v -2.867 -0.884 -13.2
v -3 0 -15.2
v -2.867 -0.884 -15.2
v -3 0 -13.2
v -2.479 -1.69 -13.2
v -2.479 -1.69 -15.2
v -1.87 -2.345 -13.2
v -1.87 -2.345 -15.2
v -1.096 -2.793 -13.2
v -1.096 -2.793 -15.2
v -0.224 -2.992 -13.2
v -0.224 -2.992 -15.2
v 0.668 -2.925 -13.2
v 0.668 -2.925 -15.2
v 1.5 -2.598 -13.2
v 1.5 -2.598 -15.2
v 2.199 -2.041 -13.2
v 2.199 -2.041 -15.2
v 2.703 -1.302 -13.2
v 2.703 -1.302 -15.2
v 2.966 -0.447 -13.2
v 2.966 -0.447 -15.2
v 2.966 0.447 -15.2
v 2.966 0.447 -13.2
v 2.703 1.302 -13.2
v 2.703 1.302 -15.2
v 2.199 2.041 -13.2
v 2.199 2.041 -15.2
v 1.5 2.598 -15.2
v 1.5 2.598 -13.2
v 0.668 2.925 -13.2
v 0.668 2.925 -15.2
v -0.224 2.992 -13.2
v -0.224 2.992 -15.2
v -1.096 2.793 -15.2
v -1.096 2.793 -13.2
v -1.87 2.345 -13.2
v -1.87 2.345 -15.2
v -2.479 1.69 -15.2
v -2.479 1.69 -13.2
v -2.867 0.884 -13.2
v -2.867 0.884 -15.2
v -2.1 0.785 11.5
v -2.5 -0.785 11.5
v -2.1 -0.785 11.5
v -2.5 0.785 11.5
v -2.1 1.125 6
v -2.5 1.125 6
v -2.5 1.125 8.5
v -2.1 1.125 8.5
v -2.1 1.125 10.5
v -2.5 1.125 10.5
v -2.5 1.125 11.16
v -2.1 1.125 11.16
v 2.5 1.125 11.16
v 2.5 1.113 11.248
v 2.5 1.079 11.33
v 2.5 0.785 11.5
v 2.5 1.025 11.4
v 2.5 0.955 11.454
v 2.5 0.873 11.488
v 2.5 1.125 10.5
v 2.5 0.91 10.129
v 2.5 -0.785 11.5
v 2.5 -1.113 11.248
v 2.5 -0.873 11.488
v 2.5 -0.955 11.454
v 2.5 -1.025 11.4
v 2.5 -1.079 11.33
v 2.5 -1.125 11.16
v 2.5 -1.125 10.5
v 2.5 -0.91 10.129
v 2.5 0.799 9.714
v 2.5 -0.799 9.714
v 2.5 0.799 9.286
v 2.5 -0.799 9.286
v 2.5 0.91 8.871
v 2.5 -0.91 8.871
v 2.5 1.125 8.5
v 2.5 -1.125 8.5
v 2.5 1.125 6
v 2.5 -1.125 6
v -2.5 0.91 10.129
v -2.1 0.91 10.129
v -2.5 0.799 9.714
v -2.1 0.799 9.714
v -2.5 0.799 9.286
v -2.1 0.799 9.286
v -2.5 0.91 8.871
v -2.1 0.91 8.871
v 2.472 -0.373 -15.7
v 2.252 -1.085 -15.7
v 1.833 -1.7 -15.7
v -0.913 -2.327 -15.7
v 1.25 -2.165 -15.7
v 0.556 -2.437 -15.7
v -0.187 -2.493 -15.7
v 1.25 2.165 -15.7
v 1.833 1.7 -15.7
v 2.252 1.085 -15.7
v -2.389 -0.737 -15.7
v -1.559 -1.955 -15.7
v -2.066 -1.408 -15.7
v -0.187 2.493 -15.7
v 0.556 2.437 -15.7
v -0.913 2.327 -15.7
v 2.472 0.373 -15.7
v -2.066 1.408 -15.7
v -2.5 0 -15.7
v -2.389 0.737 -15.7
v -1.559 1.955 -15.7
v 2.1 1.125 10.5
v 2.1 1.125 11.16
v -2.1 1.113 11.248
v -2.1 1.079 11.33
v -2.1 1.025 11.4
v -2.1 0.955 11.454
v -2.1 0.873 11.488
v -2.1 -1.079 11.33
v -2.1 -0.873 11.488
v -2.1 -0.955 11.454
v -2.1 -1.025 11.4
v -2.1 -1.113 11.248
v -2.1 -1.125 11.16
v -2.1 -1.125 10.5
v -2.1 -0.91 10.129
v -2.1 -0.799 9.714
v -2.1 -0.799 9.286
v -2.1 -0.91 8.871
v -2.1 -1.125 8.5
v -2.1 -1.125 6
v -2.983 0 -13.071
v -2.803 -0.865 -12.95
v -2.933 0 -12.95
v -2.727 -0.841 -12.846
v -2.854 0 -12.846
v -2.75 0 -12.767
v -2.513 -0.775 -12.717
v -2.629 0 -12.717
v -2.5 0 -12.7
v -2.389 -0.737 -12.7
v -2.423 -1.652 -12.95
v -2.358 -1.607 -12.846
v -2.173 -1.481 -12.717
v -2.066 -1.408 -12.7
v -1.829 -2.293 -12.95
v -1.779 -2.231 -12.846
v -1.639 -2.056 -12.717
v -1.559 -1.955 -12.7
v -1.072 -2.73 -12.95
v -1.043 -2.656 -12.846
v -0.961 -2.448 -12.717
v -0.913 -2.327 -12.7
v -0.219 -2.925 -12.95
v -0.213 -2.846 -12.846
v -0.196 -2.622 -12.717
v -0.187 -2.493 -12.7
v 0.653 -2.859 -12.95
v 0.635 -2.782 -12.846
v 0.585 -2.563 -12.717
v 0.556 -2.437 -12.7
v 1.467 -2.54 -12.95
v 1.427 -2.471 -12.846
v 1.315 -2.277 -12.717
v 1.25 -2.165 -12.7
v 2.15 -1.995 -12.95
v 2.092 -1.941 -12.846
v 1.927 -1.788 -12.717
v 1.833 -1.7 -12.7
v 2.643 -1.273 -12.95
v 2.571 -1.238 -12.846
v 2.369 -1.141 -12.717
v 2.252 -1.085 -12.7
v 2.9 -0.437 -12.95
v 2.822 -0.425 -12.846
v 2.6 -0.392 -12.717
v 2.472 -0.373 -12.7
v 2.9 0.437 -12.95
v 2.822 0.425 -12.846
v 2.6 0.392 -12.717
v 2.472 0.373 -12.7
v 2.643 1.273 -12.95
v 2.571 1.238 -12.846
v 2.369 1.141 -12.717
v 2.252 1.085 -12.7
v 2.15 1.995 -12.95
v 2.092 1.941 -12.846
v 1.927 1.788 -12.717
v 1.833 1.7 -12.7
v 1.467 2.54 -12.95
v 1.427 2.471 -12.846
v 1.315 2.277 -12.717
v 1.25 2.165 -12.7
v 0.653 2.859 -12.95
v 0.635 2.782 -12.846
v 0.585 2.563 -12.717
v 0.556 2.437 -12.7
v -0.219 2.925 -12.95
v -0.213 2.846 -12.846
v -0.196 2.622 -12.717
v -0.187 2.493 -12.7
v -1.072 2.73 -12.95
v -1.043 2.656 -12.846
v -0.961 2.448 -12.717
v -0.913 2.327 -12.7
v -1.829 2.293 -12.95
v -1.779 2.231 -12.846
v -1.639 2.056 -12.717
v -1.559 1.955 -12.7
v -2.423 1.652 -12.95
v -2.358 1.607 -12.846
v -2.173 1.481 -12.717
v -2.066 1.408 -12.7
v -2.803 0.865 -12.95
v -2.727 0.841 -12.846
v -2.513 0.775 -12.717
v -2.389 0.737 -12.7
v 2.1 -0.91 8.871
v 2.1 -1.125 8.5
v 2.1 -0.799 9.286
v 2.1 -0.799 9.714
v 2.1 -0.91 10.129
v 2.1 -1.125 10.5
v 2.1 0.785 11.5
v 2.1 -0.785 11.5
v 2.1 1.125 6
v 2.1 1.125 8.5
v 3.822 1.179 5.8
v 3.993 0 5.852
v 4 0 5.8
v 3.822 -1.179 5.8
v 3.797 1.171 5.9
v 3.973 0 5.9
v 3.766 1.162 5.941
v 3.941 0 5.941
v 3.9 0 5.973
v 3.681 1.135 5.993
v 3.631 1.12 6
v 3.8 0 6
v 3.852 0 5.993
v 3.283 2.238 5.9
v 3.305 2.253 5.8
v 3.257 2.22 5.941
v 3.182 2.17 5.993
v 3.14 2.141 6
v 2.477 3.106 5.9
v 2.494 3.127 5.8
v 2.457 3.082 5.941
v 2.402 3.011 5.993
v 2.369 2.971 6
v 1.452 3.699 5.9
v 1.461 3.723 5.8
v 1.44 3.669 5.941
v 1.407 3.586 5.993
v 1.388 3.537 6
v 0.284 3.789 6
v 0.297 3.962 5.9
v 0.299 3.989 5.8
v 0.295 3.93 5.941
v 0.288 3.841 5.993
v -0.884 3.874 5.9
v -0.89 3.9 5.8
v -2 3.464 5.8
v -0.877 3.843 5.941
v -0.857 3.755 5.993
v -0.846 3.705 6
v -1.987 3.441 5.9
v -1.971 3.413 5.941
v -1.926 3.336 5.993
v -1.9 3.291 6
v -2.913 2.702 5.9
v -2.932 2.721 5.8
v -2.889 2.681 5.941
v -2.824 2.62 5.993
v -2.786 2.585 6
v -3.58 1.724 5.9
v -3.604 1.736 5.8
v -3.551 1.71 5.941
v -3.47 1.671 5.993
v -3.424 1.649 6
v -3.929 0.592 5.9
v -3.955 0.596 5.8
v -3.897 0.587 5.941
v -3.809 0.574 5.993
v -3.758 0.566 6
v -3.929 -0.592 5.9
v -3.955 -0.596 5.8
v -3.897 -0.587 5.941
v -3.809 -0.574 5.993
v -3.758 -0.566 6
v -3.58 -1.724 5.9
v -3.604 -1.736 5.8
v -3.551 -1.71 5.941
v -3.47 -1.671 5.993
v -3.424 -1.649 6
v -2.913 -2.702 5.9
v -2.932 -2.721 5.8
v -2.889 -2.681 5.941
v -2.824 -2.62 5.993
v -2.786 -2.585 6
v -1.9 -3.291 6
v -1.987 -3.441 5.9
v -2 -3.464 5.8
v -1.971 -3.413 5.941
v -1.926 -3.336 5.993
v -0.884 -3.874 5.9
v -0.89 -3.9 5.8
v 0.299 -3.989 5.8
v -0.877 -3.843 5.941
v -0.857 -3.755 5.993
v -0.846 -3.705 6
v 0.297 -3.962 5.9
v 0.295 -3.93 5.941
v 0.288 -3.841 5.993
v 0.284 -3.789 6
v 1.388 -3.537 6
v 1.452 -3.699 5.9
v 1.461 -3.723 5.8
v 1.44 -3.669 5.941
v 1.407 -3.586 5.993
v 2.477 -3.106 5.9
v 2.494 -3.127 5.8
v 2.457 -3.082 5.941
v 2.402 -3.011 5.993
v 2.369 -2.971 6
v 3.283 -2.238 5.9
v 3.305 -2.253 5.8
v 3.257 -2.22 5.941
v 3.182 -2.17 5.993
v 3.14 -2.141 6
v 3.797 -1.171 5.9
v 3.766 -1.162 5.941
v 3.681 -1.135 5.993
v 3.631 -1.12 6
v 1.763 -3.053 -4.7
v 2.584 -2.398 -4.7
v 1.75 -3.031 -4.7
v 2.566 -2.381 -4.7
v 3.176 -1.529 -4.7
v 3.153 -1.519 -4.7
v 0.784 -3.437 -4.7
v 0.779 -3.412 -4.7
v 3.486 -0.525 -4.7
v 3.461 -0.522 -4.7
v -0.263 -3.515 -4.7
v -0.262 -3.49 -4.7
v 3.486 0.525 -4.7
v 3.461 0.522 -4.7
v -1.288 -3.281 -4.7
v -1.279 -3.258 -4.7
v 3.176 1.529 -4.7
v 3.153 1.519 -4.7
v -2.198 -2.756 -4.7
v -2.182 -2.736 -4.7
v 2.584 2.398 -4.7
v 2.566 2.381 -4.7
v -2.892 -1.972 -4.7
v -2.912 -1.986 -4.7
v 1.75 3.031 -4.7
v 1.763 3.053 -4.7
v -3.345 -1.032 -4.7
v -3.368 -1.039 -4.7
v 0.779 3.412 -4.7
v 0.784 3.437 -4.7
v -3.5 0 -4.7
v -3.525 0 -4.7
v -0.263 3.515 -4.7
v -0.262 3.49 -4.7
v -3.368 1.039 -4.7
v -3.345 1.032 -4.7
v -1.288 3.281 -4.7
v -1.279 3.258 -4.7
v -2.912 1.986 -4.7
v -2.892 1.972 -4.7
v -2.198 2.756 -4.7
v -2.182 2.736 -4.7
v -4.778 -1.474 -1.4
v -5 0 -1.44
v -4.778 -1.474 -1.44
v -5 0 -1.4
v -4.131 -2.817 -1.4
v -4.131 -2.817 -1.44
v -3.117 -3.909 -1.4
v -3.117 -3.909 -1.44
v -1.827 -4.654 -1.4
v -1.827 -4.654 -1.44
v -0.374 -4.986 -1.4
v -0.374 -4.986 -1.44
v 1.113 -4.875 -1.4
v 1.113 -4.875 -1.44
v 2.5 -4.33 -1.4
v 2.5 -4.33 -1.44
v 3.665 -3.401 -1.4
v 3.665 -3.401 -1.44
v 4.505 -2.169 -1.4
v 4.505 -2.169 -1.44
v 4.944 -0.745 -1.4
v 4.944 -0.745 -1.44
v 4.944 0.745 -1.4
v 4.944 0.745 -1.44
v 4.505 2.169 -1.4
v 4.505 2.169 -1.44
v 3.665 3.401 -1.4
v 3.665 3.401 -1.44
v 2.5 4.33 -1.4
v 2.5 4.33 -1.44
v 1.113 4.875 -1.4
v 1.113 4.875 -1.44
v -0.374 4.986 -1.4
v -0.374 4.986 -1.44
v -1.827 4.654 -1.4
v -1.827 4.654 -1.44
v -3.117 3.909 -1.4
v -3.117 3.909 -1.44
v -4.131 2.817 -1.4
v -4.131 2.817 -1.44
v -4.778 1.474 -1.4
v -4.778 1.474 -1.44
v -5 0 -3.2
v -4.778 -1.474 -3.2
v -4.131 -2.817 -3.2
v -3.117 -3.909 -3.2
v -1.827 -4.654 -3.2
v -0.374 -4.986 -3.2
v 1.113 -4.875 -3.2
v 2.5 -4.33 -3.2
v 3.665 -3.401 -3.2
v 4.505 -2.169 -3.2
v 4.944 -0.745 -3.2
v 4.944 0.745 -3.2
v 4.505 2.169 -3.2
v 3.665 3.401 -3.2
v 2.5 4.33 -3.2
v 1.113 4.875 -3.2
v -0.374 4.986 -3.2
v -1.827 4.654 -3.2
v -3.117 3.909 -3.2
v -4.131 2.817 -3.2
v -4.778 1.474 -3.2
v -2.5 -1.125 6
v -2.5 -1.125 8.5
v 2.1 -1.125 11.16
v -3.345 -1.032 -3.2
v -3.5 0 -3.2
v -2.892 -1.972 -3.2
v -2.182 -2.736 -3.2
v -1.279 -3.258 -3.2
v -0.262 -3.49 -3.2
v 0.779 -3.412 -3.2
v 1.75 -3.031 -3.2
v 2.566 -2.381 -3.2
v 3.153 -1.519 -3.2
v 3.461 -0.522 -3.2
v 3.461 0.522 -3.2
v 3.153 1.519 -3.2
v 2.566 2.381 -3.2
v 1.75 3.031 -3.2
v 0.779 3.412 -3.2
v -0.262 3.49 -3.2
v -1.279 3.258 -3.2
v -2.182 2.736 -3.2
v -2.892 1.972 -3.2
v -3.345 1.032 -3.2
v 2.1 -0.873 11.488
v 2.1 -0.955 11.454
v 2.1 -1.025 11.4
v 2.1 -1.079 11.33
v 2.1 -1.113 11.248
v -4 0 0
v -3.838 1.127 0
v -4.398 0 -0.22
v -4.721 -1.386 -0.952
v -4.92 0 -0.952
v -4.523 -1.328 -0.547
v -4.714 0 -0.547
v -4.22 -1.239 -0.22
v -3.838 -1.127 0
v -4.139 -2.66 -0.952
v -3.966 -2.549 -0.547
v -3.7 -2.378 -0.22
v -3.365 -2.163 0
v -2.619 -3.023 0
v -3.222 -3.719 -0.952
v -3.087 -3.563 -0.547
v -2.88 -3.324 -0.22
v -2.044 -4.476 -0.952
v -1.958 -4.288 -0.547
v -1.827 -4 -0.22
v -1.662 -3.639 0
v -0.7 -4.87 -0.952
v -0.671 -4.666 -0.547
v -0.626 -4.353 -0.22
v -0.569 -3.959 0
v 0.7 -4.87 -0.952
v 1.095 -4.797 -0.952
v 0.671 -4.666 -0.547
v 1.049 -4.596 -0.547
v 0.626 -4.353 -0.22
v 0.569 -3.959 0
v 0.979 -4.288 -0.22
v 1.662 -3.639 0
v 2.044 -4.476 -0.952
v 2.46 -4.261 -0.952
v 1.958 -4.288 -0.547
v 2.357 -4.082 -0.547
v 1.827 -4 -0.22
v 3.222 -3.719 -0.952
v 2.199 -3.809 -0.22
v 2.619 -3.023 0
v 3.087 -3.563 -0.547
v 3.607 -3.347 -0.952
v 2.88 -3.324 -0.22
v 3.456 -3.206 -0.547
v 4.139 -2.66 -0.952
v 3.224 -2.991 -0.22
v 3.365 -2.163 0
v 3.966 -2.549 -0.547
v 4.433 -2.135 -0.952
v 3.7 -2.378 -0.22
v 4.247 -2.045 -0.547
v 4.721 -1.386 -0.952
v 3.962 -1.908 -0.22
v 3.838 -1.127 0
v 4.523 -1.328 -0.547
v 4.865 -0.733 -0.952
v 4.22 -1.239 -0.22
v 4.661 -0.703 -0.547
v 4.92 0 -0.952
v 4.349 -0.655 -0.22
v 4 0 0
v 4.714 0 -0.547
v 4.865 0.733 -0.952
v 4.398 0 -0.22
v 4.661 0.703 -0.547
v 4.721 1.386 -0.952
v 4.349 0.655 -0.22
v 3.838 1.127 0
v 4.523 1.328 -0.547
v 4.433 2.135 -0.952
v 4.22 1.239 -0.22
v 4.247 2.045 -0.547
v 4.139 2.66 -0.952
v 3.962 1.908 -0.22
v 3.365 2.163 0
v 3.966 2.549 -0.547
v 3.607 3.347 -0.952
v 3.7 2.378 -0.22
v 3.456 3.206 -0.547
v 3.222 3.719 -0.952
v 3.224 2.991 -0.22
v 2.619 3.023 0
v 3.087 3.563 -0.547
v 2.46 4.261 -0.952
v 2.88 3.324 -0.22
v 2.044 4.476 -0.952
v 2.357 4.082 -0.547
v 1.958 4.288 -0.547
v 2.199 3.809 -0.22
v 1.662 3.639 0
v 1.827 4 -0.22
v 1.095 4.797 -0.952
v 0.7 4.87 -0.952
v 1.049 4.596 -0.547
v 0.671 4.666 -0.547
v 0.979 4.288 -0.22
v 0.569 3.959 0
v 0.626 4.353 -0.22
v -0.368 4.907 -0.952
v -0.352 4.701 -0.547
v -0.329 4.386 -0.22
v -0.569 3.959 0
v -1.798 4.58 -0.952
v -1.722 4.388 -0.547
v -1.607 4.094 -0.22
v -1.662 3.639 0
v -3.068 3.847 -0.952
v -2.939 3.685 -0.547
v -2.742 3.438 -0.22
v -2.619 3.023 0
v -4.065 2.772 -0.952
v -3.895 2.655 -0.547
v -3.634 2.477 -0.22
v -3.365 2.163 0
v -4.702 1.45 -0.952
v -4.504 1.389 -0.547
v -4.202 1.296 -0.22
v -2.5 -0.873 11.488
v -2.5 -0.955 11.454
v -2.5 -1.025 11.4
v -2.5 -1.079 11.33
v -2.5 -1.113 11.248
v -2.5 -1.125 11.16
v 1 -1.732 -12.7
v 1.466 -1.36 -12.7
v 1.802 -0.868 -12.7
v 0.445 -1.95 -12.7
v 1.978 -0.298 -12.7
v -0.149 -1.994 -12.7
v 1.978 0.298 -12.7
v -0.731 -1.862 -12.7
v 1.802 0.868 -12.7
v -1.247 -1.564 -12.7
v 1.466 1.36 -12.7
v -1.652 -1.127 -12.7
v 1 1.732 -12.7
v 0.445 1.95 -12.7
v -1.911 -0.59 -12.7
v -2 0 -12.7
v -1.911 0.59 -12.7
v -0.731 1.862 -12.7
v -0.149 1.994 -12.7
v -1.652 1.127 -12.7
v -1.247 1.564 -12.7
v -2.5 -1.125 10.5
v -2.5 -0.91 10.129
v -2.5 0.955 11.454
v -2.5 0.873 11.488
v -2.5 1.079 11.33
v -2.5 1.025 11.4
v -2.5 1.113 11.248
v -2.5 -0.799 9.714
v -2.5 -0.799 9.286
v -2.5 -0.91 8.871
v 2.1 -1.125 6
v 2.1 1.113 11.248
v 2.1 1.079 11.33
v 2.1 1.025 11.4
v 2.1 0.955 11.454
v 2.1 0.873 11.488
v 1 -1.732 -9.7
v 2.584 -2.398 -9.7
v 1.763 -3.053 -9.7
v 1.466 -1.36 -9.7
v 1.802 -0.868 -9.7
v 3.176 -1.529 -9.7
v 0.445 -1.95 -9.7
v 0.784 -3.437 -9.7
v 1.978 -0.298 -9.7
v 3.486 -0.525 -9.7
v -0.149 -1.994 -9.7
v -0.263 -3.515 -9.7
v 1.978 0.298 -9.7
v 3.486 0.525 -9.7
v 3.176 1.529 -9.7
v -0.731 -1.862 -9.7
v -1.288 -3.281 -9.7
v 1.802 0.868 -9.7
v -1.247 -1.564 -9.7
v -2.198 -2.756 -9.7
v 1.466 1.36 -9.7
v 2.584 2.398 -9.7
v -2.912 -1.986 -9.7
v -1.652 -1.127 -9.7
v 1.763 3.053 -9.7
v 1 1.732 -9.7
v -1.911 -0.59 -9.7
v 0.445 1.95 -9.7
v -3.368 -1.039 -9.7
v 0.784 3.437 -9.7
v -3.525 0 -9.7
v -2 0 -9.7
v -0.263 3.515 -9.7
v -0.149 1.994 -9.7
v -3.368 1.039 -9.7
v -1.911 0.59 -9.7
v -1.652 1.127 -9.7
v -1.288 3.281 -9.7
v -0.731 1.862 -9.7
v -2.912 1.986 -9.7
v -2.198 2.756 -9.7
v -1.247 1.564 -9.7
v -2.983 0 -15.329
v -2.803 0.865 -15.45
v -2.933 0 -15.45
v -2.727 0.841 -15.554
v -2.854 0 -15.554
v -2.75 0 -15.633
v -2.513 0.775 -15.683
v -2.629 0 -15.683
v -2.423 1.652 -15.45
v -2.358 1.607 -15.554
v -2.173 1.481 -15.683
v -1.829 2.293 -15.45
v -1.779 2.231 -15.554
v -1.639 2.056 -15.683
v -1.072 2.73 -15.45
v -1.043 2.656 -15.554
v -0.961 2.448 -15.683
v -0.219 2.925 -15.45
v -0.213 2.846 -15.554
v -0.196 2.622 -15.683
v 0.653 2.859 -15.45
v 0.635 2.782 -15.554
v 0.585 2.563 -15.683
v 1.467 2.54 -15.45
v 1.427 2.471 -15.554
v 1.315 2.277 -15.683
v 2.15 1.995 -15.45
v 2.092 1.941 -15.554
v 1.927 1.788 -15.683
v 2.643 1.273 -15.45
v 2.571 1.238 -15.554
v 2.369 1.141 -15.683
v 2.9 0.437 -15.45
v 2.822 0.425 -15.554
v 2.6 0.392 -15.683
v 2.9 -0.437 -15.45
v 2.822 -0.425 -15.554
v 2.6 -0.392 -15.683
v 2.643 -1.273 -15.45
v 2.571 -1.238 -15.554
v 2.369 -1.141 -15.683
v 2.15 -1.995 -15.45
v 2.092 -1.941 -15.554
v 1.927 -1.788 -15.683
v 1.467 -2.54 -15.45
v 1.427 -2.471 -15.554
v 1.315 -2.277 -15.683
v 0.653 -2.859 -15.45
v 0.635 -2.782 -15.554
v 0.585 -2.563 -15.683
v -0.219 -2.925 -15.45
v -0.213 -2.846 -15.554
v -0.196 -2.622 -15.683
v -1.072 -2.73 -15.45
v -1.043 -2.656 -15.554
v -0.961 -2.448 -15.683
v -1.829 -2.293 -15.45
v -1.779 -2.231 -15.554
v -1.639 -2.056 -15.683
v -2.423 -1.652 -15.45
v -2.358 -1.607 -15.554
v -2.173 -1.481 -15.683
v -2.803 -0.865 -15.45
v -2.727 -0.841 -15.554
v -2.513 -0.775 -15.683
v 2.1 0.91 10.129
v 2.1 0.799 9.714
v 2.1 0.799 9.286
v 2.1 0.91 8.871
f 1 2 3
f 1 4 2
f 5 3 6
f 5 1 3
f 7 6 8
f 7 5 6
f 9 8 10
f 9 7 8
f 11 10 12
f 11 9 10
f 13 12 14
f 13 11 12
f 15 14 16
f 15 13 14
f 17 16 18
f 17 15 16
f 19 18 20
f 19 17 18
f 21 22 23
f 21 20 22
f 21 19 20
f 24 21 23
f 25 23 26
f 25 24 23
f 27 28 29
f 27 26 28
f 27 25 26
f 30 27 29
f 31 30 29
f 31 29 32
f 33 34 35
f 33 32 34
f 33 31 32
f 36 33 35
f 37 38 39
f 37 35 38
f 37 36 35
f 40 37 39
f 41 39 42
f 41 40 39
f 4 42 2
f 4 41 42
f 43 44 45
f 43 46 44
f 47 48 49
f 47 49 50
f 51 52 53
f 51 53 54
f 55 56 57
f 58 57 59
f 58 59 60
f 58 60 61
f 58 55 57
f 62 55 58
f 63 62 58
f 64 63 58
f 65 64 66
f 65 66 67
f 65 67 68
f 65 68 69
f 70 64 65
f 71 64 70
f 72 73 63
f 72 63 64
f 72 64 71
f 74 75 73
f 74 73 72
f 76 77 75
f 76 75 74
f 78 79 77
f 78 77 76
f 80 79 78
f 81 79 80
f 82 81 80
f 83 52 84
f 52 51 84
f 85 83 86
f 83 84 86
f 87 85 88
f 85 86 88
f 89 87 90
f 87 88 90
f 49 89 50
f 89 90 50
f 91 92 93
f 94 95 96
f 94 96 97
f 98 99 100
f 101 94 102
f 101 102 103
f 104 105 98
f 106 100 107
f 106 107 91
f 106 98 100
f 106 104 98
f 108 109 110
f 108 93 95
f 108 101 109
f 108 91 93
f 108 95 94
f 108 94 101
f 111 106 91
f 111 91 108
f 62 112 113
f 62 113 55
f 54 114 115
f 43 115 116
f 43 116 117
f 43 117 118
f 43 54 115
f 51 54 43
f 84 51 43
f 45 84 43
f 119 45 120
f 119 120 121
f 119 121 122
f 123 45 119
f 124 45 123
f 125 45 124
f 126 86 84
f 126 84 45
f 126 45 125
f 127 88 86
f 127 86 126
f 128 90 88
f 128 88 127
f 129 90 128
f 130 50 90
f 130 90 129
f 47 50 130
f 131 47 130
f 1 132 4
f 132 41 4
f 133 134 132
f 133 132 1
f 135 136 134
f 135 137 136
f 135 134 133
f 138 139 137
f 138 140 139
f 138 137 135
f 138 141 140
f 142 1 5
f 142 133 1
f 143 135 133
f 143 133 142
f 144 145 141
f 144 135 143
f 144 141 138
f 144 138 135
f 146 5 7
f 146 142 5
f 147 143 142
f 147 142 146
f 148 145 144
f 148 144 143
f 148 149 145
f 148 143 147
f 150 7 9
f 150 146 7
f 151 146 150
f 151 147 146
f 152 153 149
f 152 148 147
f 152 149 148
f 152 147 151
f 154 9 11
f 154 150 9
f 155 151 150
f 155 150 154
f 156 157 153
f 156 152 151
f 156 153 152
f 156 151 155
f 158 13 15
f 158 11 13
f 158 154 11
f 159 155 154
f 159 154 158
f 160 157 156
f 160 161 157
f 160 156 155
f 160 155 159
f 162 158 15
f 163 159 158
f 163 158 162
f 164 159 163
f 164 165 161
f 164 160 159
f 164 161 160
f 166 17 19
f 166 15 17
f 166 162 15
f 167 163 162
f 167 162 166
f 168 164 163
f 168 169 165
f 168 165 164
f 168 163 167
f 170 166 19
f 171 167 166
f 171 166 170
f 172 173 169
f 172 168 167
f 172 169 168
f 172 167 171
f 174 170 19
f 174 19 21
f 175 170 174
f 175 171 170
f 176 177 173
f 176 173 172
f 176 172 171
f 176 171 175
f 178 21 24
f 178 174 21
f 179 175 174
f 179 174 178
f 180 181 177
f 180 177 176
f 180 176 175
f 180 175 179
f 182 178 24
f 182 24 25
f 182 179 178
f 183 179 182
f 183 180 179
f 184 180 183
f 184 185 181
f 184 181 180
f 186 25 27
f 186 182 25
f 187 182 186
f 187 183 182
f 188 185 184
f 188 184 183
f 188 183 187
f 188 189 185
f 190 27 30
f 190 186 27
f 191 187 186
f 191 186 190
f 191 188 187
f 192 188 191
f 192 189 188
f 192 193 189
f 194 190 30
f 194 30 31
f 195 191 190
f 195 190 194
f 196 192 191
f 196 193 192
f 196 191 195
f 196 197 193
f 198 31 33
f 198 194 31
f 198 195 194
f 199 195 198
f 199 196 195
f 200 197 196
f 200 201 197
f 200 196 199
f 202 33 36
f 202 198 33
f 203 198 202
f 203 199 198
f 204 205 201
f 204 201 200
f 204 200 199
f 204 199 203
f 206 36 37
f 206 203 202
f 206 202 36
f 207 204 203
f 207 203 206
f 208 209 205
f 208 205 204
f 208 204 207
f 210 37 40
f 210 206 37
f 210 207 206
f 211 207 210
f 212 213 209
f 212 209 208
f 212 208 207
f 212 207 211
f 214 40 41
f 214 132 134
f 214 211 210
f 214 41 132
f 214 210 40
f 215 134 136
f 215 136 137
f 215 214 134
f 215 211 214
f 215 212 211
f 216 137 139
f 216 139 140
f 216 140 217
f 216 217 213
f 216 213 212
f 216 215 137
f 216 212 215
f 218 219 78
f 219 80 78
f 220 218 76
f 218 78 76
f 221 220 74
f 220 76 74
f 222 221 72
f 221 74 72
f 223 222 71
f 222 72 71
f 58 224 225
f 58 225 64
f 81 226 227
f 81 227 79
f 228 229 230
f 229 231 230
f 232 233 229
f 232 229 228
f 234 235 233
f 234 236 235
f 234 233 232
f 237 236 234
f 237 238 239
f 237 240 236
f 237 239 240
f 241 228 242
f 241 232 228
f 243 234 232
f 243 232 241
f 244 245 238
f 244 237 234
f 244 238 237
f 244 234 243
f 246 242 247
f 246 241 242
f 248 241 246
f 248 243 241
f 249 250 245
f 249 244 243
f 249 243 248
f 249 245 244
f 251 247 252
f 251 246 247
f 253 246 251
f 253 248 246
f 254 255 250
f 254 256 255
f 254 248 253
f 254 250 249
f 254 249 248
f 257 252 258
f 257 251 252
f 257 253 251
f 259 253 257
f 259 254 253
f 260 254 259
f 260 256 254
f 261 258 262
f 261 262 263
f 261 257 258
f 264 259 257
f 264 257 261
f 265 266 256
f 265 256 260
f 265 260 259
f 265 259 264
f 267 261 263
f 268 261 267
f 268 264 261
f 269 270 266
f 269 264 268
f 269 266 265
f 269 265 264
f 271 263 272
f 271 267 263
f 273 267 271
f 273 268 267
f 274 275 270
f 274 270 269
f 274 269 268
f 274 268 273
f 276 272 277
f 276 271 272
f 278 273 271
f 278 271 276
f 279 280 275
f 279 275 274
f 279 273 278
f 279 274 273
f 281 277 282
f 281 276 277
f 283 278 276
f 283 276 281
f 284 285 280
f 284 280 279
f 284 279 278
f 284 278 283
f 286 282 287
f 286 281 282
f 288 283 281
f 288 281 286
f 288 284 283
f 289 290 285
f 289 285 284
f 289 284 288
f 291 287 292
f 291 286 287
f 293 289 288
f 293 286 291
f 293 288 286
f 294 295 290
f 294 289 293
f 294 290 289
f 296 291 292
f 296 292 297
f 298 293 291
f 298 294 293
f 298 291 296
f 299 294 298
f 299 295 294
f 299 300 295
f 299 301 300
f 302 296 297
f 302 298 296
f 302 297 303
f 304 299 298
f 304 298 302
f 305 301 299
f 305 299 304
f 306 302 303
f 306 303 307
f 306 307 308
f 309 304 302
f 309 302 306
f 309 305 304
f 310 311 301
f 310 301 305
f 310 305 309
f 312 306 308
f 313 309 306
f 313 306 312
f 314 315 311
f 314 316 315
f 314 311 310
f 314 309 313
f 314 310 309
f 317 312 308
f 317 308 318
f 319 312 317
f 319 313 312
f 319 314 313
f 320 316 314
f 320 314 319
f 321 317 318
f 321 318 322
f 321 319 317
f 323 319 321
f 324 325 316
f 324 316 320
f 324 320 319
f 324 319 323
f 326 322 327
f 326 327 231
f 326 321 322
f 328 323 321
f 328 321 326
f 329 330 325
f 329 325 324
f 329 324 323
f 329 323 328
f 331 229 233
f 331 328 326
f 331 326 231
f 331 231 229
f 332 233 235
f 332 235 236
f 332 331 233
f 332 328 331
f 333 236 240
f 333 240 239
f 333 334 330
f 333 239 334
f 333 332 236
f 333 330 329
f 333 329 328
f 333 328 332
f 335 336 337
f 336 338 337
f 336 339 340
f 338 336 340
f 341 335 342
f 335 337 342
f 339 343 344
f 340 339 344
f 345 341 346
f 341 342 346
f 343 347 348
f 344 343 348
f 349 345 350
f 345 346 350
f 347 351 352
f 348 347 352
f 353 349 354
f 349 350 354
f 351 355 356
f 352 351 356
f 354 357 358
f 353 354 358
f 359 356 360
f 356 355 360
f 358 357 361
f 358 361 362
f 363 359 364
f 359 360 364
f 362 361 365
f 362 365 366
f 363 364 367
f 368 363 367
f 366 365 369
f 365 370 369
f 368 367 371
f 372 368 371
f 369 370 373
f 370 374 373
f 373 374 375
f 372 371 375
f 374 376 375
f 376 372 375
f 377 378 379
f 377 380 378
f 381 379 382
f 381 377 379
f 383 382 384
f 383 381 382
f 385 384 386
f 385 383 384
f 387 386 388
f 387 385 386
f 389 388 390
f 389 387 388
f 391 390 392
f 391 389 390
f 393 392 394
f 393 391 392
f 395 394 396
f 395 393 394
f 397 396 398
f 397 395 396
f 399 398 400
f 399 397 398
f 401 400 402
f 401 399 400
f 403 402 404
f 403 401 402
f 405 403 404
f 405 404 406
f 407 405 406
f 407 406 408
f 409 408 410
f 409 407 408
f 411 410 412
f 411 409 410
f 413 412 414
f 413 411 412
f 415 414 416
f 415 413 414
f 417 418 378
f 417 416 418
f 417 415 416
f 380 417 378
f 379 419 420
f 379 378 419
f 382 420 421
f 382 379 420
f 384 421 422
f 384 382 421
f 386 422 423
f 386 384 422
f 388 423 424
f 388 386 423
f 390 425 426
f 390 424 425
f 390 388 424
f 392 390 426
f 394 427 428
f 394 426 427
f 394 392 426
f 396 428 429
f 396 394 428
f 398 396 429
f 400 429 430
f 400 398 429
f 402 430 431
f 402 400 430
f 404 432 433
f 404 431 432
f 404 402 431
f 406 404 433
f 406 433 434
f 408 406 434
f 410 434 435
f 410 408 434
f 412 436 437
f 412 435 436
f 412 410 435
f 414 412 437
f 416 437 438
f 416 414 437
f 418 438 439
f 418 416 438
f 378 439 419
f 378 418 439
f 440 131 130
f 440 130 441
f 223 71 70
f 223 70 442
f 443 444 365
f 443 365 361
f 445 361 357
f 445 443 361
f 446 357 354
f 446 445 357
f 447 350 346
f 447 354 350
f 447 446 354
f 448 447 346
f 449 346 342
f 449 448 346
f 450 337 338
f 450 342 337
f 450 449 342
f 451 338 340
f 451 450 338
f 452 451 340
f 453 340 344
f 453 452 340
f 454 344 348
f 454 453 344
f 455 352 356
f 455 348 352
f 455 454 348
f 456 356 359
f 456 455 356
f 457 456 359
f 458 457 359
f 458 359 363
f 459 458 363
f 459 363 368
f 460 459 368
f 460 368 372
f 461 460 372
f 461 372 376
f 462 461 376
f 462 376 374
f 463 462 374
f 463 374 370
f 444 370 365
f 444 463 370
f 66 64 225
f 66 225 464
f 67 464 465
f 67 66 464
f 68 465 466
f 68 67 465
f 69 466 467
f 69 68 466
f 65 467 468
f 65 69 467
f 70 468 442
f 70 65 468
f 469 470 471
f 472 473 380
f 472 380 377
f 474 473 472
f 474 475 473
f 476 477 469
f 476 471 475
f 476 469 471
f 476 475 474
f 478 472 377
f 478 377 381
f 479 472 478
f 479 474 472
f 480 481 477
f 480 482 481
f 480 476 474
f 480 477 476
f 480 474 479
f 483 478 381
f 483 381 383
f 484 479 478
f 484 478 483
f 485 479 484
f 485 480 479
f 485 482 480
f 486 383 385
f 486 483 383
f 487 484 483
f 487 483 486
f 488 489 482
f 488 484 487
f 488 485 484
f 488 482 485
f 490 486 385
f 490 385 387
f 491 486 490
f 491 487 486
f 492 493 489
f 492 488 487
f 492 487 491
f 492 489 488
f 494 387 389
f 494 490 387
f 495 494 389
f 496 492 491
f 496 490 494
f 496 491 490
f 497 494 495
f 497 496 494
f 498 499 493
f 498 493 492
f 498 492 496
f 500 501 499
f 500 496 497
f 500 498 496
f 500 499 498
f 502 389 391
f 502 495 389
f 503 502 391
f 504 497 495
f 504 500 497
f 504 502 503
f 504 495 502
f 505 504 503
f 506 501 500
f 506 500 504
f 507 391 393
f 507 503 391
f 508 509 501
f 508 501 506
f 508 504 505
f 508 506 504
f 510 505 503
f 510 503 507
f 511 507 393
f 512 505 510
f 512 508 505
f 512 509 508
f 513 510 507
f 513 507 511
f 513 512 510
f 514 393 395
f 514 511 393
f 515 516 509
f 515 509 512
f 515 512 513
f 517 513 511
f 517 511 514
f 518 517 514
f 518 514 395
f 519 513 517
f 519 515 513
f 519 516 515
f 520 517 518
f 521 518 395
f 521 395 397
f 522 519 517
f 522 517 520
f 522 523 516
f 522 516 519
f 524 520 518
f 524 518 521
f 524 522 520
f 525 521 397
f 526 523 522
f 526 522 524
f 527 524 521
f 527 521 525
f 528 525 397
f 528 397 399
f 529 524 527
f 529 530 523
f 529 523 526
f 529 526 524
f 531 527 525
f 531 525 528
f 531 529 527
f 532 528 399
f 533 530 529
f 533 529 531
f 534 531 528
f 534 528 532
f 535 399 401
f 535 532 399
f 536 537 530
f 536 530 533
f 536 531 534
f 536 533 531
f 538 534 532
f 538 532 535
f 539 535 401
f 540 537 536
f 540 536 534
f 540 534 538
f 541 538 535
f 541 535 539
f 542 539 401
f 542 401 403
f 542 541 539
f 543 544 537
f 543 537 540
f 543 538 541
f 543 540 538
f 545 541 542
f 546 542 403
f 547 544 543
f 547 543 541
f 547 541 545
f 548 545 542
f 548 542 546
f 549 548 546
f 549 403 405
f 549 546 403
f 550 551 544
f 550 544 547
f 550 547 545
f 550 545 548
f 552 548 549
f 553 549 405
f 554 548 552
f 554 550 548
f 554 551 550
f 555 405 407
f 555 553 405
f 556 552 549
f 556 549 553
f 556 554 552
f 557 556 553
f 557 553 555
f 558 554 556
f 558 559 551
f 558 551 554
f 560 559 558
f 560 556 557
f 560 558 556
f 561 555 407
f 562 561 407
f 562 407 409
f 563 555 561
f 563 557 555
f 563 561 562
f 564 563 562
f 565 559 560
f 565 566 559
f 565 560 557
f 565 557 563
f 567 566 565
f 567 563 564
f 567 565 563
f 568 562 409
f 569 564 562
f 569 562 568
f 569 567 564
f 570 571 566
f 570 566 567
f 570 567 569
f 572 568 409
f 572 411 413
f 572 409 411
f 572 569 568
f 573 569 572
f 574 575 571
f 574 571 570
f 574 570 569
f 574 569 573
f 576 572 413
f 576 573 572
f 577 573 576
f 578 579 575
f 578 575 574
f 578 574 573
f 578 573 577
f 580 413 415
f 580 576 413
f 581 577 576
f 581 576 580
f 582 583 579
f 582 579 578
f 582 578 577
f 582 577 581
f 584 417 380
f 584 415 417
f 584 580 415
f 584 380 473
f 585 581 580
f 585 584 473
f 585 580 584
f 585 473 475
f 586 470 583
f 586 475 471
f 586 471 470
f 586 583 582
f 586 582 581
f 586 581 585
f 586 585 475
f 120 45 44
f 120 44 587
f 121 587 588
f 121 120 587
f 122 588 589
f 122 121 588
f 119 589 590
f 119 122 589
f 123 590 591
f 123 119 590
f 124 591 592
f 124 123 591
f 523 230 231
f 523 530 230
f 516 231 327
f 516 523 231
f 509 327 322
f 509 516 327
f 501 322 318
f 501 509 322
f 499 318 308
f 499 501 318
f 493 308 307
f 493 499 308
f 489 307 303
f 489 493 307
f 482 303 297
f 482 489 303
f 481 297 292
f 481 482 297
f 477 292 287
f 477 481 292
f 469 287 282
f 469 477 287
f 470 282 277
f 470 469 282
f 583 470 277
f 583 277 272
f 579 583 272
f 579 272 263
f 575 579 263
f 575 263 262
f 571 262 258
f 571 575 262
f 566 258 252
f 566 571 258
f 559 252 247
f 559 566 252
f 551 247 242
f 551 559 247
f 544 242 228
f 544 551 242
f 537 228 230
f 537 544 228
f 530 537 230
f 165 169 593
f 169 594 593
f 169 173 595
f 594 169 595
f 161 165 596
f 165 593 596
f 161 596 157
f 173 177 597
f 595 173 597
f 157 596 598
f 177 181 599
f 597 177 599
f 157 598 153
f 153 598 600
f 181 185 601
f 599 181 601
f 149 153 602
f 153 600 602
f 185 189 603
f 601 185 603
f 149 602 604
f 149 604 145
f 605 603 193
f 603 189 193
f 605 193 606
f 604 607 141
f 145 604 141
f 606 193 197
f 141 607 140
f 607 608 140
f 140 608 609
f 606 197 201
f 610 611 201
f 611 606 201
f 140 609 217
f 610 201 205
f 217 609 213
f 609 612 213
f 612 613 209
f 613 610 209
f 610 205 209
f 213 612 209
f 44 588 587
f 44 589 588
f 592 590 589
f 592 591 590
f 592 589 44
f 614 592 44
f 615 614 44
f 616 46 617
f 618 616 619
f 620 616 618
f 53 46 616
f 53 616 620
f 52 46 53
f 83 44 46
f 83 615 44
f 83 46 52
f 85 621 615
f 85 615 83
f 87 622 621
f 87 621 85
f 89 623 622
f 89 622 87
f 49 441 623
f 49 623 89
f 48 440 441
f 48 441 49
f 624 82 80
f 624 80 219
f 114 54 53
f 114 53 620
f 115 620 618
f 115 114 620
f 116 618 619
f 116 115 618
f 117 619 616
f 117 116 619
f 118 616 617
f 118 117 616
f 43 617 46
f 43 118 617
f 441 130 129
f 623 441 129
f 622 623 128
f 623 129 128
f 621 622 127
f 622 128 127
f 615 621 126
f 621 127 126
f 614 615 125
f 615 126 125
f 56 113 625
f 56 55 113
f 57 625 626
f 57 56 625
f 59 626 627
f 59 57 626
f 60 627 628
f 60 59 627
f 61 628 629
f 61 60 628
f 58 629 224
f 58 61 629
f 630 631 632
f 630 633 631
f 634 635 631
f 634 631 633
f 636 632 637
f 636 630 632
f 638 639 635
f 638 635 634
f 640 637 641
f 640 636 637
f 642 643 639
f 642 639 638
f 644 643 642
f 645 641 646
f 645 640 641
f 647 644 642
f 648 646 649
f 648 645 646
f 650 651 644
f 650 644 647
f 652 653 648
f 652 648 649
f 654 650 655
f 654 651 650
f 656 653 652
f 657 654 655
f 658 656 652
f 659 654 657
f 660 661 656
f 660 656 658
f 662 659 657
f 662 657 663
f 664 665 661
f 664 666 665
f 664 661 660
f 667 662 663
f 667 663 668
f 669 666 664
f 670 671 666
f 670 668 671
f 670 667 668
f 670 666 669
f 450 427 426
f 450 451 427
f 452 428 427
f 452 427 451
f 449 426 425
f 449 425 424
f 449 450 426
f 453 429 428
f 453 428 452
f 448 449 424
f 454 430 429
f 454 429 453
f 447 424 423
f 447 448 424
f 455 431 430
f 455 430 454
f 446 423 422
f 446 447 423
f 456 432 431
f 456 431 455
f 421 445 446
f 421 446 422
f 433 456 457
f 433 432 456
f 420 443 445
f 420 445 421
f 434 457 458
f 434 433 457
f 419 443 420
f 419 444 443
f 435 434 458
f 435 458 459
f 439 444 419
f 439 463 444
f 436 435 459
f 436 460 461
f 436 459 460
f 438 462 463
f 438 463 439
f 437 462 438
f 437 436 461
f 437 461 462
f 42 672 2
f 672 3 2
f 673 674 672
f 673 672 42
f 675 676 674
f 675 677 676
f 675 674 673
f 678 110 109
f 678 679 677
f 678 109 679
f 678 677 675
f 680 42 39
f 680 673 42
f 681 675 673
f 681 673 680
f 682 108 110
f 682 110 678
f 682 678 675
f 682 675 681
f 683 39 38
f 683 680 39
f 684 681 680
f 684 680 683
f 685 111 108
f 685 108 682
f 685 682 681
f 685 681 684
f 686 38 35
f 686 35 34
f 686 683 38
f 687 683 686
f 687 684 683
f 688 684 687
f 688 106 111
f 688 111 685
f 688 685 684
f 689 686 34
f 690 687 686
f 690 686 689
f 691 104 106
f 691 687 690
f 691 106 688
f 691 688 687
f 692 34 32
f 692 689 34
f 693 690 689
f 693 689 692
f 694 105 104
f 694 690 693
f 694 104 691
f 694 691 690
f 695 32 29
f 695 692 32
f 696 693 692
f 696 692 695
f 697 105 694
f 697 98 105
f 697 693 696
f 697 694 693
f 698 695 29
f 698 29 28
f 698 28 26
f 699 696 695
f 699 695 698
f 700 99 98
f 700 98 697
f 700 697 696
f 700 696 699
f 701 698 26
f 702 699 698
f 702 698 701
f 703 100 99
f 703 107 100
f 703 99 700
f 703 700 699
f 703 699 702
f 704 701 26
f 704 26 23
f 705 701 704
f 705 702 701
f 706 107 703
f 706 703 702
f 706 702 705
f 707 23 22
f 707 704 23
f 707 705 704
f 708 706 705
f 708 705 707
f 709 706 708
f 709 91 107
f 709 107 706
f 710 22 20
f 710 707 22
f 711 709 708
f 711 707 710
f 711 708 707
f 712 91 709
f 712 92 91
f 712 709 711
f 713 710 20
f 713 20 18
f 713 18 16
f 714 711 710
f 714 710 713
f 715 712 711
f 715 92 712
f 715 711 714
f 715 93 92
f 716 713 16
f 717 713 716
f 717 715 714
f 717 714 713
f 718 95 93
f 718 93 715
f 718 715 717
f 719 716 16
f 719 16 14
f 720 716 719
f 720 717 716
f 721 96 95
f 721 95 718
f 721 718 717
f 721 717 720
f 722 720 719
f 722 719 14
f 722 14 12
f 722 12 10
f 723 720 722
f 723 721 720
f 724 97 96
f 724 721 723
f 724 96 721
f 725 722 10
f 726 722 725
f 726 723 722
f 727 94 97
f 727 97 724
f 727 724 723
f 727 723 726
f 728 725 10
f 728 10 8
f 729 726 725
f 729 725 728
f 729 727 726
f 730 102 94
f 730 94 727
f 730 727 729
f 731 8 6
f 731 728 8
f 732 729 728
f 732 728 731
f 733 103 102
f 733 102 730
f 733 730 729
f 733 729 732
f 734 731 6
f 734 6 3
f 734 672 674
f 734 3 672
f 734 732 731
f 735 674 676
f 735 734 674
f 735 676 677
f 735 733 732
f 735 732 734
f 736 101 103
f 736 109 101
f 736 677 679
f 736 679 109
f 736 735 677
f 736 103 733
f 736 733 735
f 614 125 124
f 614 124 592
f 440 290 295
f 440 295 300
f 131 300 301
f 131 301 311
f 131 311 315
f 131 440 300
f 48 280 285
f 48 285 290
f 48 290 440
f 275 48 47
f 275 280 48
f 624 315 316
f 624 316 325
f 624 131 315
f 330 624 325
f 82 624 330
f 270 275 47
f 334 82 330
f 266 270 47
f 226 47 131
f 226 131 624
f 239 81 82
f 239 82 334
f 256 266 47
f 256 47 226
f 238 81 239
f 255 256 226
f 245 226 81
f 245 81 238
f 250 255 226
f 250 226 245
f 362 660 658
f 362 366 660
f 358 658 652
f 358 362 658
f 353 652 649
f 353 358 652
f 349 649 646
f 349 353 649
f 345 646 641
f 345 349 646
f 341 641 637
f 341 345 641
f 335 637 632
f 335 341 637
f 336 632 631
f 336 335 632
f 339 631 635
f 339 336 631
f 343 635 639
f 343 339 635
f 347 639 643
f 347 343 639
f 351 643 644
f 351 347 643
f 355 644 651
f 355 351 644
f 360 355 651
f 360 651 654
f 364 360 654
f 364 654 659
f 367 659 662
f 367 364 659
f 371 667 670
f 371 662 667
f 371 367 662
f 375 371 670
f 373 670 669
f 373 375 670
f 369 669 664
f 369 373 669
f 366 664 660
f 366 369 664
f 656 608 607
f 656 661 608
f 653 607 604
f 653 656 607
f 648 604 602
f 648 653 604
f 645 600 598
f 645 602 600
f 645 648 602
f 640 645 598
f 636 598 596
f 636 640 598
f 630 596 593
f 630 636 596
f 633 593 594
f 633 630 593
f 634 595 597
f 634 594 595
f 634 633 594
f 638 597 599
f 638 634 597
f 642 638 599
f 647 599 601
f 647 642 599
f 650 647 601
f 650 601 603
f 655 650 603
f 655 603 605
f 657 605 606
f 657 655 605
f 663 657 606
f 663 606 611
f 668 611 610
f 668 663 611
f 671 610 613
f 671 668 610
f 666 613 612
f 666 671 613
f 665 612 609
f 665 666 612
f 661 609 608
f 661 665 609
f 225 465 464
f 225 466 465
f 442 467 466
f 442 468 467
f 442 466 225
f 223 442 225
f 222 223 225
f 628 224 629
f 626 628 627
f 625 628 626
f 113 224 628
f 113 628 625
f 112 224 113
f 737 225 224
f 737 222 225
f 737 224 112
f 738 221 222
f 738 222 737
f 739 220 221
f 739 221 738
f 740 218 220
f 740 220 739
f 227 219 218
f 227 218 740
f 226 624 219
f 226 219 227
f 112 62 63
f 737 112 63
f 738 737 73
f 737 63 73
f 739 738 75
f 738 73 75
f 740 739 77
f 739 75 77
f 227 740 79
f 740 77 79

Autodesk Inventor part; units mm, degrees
ref_plane "YZ Plane" through (0, 0, 0) normal (1, 0, 0) x (0, 1, 0)
ref_plane "XZ Plane" through (0, 0, 0) normal (0, 1, 0) x (-1, 0, 0)
ref_plane "XY Plane" through (0, 0, 0) normal (0, 0, 1) x (1, 0, 0)
sketch "Sketch1" plane through (0, 0, 0) normal (0, 0, 1) x (1, 0, 0)
  circle A0 centre (0, 0) radius 4
  dimension "d0" = 8
extrude "Extrusion1" add sketch "Sketch1" along normal blind 6
sketch "Sketch2" plane through (0, 0, 6) normal (0, 0, 1) x (1, 0, 0)
  line L0 (2.1, 1.125) -> (2.5, 1.125)
  line L1 (2.5, 1.125) -> (2.5, -1.125)
  line L2 (2.5, -1.125) -> (2.1, -1.125)
  line L3 (2.1, -1.125) -> (2.1, 1.125)
  line L4 (-2.5, 1.125) -> (-2.1, 1.125)
  line L5 (-2.1, 1.125) -> (-2.1, -1.125)
  line L6 (-2.1, -1.125) -> (-2.5, -1.125)
  line L7 (-2.5, -1.125) -> (-2.5, 1.125)
  point P0 (0, 0)
  point P1 (2.1, 0)
  point P2 (-2.5, 0)
  dimension "d3" = 2.25
  dimension "d6" = 2.25
  dimension "d9" = 0.4
  dimension "d10" = 0.4
  dimension "d11" = 2.5
  dimension "d12" = 2.5
extrude "Extrusion2" add sketch "Sketch2" along normal blind 5.5
sketch "Sketch3" plane through (2.5, -1.125, 6) normal (1, 0, 0) x (0, 0, -1)
  line L0 (0, 2.25) -> (-5.5, 2.25) projected
  line L1 (0, 2.25) -> (-2.5, 2.25)
  arc A0 (-4.5, 2.25) -> (-2.5, 2.25) centre (-3.5, 3.549) ccw
  line L2 (-5.5, 0) -> (-5.5, 2.25) projected
  line L3 (-5.5, 1.125) -> (-5.2177, 1.125)
  arc A1 (-5.1597, 2.25) -> (-5.5, 1.9097) centre (-5.1597, 1.9097) ccw
  line L4 (-5.5, 1.9097) -> (-5.1597, 2.25) construction
  line L5 (-5.5, 1.9097) -> (-5.0187, 1.9097) construction
  line L6 (-5.5, 1.125) -> (-5.5, 1.9097)
  line L7 (-5.1597, 2.25) -> (-4.5, 2.25)
  arc A2 (-2.5, 0) -> (-4.5, 0) centre (-3.5, -1.299) ccw
  arc A3 (-5.5, 0.3403) -> (-5.1597, 0) centre (-5.1597, 0.3403) ccw
  line L8 (0, 0) -> (-5.5, 0) projected
  line L9 (-5.5, 0.3403) -> (-5.5, 0)
  line L10 (-5.5, 0) -> (-5.1597, 0)
  line L11 (-4.5, 0) -> (-2.5, 0)
  point P0 (6, 1.125)
  dimension "d15" = 2.5
  dimension "d16" = 2
  dimension "d17" = 45
extrude "Extrusion3" cut sketch "Sketch3" against normal up to surface (5 mm away)
sketch "Sketch4" plane through (0, 0, 0) normal (0, 1, 0) x (-1, 0, 0)
  line L0 (0, 0) -> (0, -3.2)
  line L1 (0, -3.2) -> (5, -3.2)
  line L2 (5, -3.2) -> (5, -1.4)
  line L3 (-4, 0) -> (4, 0) projected
  arc A0 (5, -1.4404) -> (4, 0) centre (3.4626, -1.4404) ccw
  line L4 (4, 0) -> (0, 0)
  dimension "d20" = 3.2
  dimension "d21" = 5
  dimension "d22" = 1.8
revolve "Revolution1" add sketch "Sketch4" angle 360 about axis through (0, 0, 0) along (0, 0, -1)
sketch "Sketch5" plane through (0, 0, -3.2) normal (0, 0, -1) x (-1, 0, 0)
  circle A0 centre (0, 0) radius 3.5
  dimension "d24" = 7
extrude "Extrusion4" add sketch "Sketch5" along normal blind 1.5
sketch "Sketch7" plane through (0, 0, -4.7) normal (0, 0, -1) x (-1, 0, 0)
  circle A0 centre (0, 0) radius 3.525
  dimension "d29" = 7.05
extrude "Extrusion6" add sketch "Sketch7" along normal blind 5
thread "Thread1" size "M6x1" class "6g" standard "ANSI Metric M Profile" length 10
sketch "Sketch8" plane through (0, 0, -9.7) normal (0, 0, -1) x (-1, 0, 0)
  circle A0 centre (0, 0) radius 2
  dimension "d34" = 4
extrude "Extrusion7" add sketch "Sketch8" along normal blind 3
sketch "Sketch9" plane through (0, 0, -12.7) normal (0, 0, -1) x (-1, 0, 0)
  circle A0 centre (0, 0) radius 3
  dimension "d37" = 6
extrude "Extrusion8" add sketch "Sketch9" along normal blind 3
fillet "Fillet1" radius 0.5 2 edges at (3, 0, -12.7) (3, 0, -15.7)
fillet "Fillet2" radius 0.2 1 edges at (-4, 0, 6)
equation "\"d9\" = d10"
equation "\"d12\" = d11"
properties part number "Push Button"
